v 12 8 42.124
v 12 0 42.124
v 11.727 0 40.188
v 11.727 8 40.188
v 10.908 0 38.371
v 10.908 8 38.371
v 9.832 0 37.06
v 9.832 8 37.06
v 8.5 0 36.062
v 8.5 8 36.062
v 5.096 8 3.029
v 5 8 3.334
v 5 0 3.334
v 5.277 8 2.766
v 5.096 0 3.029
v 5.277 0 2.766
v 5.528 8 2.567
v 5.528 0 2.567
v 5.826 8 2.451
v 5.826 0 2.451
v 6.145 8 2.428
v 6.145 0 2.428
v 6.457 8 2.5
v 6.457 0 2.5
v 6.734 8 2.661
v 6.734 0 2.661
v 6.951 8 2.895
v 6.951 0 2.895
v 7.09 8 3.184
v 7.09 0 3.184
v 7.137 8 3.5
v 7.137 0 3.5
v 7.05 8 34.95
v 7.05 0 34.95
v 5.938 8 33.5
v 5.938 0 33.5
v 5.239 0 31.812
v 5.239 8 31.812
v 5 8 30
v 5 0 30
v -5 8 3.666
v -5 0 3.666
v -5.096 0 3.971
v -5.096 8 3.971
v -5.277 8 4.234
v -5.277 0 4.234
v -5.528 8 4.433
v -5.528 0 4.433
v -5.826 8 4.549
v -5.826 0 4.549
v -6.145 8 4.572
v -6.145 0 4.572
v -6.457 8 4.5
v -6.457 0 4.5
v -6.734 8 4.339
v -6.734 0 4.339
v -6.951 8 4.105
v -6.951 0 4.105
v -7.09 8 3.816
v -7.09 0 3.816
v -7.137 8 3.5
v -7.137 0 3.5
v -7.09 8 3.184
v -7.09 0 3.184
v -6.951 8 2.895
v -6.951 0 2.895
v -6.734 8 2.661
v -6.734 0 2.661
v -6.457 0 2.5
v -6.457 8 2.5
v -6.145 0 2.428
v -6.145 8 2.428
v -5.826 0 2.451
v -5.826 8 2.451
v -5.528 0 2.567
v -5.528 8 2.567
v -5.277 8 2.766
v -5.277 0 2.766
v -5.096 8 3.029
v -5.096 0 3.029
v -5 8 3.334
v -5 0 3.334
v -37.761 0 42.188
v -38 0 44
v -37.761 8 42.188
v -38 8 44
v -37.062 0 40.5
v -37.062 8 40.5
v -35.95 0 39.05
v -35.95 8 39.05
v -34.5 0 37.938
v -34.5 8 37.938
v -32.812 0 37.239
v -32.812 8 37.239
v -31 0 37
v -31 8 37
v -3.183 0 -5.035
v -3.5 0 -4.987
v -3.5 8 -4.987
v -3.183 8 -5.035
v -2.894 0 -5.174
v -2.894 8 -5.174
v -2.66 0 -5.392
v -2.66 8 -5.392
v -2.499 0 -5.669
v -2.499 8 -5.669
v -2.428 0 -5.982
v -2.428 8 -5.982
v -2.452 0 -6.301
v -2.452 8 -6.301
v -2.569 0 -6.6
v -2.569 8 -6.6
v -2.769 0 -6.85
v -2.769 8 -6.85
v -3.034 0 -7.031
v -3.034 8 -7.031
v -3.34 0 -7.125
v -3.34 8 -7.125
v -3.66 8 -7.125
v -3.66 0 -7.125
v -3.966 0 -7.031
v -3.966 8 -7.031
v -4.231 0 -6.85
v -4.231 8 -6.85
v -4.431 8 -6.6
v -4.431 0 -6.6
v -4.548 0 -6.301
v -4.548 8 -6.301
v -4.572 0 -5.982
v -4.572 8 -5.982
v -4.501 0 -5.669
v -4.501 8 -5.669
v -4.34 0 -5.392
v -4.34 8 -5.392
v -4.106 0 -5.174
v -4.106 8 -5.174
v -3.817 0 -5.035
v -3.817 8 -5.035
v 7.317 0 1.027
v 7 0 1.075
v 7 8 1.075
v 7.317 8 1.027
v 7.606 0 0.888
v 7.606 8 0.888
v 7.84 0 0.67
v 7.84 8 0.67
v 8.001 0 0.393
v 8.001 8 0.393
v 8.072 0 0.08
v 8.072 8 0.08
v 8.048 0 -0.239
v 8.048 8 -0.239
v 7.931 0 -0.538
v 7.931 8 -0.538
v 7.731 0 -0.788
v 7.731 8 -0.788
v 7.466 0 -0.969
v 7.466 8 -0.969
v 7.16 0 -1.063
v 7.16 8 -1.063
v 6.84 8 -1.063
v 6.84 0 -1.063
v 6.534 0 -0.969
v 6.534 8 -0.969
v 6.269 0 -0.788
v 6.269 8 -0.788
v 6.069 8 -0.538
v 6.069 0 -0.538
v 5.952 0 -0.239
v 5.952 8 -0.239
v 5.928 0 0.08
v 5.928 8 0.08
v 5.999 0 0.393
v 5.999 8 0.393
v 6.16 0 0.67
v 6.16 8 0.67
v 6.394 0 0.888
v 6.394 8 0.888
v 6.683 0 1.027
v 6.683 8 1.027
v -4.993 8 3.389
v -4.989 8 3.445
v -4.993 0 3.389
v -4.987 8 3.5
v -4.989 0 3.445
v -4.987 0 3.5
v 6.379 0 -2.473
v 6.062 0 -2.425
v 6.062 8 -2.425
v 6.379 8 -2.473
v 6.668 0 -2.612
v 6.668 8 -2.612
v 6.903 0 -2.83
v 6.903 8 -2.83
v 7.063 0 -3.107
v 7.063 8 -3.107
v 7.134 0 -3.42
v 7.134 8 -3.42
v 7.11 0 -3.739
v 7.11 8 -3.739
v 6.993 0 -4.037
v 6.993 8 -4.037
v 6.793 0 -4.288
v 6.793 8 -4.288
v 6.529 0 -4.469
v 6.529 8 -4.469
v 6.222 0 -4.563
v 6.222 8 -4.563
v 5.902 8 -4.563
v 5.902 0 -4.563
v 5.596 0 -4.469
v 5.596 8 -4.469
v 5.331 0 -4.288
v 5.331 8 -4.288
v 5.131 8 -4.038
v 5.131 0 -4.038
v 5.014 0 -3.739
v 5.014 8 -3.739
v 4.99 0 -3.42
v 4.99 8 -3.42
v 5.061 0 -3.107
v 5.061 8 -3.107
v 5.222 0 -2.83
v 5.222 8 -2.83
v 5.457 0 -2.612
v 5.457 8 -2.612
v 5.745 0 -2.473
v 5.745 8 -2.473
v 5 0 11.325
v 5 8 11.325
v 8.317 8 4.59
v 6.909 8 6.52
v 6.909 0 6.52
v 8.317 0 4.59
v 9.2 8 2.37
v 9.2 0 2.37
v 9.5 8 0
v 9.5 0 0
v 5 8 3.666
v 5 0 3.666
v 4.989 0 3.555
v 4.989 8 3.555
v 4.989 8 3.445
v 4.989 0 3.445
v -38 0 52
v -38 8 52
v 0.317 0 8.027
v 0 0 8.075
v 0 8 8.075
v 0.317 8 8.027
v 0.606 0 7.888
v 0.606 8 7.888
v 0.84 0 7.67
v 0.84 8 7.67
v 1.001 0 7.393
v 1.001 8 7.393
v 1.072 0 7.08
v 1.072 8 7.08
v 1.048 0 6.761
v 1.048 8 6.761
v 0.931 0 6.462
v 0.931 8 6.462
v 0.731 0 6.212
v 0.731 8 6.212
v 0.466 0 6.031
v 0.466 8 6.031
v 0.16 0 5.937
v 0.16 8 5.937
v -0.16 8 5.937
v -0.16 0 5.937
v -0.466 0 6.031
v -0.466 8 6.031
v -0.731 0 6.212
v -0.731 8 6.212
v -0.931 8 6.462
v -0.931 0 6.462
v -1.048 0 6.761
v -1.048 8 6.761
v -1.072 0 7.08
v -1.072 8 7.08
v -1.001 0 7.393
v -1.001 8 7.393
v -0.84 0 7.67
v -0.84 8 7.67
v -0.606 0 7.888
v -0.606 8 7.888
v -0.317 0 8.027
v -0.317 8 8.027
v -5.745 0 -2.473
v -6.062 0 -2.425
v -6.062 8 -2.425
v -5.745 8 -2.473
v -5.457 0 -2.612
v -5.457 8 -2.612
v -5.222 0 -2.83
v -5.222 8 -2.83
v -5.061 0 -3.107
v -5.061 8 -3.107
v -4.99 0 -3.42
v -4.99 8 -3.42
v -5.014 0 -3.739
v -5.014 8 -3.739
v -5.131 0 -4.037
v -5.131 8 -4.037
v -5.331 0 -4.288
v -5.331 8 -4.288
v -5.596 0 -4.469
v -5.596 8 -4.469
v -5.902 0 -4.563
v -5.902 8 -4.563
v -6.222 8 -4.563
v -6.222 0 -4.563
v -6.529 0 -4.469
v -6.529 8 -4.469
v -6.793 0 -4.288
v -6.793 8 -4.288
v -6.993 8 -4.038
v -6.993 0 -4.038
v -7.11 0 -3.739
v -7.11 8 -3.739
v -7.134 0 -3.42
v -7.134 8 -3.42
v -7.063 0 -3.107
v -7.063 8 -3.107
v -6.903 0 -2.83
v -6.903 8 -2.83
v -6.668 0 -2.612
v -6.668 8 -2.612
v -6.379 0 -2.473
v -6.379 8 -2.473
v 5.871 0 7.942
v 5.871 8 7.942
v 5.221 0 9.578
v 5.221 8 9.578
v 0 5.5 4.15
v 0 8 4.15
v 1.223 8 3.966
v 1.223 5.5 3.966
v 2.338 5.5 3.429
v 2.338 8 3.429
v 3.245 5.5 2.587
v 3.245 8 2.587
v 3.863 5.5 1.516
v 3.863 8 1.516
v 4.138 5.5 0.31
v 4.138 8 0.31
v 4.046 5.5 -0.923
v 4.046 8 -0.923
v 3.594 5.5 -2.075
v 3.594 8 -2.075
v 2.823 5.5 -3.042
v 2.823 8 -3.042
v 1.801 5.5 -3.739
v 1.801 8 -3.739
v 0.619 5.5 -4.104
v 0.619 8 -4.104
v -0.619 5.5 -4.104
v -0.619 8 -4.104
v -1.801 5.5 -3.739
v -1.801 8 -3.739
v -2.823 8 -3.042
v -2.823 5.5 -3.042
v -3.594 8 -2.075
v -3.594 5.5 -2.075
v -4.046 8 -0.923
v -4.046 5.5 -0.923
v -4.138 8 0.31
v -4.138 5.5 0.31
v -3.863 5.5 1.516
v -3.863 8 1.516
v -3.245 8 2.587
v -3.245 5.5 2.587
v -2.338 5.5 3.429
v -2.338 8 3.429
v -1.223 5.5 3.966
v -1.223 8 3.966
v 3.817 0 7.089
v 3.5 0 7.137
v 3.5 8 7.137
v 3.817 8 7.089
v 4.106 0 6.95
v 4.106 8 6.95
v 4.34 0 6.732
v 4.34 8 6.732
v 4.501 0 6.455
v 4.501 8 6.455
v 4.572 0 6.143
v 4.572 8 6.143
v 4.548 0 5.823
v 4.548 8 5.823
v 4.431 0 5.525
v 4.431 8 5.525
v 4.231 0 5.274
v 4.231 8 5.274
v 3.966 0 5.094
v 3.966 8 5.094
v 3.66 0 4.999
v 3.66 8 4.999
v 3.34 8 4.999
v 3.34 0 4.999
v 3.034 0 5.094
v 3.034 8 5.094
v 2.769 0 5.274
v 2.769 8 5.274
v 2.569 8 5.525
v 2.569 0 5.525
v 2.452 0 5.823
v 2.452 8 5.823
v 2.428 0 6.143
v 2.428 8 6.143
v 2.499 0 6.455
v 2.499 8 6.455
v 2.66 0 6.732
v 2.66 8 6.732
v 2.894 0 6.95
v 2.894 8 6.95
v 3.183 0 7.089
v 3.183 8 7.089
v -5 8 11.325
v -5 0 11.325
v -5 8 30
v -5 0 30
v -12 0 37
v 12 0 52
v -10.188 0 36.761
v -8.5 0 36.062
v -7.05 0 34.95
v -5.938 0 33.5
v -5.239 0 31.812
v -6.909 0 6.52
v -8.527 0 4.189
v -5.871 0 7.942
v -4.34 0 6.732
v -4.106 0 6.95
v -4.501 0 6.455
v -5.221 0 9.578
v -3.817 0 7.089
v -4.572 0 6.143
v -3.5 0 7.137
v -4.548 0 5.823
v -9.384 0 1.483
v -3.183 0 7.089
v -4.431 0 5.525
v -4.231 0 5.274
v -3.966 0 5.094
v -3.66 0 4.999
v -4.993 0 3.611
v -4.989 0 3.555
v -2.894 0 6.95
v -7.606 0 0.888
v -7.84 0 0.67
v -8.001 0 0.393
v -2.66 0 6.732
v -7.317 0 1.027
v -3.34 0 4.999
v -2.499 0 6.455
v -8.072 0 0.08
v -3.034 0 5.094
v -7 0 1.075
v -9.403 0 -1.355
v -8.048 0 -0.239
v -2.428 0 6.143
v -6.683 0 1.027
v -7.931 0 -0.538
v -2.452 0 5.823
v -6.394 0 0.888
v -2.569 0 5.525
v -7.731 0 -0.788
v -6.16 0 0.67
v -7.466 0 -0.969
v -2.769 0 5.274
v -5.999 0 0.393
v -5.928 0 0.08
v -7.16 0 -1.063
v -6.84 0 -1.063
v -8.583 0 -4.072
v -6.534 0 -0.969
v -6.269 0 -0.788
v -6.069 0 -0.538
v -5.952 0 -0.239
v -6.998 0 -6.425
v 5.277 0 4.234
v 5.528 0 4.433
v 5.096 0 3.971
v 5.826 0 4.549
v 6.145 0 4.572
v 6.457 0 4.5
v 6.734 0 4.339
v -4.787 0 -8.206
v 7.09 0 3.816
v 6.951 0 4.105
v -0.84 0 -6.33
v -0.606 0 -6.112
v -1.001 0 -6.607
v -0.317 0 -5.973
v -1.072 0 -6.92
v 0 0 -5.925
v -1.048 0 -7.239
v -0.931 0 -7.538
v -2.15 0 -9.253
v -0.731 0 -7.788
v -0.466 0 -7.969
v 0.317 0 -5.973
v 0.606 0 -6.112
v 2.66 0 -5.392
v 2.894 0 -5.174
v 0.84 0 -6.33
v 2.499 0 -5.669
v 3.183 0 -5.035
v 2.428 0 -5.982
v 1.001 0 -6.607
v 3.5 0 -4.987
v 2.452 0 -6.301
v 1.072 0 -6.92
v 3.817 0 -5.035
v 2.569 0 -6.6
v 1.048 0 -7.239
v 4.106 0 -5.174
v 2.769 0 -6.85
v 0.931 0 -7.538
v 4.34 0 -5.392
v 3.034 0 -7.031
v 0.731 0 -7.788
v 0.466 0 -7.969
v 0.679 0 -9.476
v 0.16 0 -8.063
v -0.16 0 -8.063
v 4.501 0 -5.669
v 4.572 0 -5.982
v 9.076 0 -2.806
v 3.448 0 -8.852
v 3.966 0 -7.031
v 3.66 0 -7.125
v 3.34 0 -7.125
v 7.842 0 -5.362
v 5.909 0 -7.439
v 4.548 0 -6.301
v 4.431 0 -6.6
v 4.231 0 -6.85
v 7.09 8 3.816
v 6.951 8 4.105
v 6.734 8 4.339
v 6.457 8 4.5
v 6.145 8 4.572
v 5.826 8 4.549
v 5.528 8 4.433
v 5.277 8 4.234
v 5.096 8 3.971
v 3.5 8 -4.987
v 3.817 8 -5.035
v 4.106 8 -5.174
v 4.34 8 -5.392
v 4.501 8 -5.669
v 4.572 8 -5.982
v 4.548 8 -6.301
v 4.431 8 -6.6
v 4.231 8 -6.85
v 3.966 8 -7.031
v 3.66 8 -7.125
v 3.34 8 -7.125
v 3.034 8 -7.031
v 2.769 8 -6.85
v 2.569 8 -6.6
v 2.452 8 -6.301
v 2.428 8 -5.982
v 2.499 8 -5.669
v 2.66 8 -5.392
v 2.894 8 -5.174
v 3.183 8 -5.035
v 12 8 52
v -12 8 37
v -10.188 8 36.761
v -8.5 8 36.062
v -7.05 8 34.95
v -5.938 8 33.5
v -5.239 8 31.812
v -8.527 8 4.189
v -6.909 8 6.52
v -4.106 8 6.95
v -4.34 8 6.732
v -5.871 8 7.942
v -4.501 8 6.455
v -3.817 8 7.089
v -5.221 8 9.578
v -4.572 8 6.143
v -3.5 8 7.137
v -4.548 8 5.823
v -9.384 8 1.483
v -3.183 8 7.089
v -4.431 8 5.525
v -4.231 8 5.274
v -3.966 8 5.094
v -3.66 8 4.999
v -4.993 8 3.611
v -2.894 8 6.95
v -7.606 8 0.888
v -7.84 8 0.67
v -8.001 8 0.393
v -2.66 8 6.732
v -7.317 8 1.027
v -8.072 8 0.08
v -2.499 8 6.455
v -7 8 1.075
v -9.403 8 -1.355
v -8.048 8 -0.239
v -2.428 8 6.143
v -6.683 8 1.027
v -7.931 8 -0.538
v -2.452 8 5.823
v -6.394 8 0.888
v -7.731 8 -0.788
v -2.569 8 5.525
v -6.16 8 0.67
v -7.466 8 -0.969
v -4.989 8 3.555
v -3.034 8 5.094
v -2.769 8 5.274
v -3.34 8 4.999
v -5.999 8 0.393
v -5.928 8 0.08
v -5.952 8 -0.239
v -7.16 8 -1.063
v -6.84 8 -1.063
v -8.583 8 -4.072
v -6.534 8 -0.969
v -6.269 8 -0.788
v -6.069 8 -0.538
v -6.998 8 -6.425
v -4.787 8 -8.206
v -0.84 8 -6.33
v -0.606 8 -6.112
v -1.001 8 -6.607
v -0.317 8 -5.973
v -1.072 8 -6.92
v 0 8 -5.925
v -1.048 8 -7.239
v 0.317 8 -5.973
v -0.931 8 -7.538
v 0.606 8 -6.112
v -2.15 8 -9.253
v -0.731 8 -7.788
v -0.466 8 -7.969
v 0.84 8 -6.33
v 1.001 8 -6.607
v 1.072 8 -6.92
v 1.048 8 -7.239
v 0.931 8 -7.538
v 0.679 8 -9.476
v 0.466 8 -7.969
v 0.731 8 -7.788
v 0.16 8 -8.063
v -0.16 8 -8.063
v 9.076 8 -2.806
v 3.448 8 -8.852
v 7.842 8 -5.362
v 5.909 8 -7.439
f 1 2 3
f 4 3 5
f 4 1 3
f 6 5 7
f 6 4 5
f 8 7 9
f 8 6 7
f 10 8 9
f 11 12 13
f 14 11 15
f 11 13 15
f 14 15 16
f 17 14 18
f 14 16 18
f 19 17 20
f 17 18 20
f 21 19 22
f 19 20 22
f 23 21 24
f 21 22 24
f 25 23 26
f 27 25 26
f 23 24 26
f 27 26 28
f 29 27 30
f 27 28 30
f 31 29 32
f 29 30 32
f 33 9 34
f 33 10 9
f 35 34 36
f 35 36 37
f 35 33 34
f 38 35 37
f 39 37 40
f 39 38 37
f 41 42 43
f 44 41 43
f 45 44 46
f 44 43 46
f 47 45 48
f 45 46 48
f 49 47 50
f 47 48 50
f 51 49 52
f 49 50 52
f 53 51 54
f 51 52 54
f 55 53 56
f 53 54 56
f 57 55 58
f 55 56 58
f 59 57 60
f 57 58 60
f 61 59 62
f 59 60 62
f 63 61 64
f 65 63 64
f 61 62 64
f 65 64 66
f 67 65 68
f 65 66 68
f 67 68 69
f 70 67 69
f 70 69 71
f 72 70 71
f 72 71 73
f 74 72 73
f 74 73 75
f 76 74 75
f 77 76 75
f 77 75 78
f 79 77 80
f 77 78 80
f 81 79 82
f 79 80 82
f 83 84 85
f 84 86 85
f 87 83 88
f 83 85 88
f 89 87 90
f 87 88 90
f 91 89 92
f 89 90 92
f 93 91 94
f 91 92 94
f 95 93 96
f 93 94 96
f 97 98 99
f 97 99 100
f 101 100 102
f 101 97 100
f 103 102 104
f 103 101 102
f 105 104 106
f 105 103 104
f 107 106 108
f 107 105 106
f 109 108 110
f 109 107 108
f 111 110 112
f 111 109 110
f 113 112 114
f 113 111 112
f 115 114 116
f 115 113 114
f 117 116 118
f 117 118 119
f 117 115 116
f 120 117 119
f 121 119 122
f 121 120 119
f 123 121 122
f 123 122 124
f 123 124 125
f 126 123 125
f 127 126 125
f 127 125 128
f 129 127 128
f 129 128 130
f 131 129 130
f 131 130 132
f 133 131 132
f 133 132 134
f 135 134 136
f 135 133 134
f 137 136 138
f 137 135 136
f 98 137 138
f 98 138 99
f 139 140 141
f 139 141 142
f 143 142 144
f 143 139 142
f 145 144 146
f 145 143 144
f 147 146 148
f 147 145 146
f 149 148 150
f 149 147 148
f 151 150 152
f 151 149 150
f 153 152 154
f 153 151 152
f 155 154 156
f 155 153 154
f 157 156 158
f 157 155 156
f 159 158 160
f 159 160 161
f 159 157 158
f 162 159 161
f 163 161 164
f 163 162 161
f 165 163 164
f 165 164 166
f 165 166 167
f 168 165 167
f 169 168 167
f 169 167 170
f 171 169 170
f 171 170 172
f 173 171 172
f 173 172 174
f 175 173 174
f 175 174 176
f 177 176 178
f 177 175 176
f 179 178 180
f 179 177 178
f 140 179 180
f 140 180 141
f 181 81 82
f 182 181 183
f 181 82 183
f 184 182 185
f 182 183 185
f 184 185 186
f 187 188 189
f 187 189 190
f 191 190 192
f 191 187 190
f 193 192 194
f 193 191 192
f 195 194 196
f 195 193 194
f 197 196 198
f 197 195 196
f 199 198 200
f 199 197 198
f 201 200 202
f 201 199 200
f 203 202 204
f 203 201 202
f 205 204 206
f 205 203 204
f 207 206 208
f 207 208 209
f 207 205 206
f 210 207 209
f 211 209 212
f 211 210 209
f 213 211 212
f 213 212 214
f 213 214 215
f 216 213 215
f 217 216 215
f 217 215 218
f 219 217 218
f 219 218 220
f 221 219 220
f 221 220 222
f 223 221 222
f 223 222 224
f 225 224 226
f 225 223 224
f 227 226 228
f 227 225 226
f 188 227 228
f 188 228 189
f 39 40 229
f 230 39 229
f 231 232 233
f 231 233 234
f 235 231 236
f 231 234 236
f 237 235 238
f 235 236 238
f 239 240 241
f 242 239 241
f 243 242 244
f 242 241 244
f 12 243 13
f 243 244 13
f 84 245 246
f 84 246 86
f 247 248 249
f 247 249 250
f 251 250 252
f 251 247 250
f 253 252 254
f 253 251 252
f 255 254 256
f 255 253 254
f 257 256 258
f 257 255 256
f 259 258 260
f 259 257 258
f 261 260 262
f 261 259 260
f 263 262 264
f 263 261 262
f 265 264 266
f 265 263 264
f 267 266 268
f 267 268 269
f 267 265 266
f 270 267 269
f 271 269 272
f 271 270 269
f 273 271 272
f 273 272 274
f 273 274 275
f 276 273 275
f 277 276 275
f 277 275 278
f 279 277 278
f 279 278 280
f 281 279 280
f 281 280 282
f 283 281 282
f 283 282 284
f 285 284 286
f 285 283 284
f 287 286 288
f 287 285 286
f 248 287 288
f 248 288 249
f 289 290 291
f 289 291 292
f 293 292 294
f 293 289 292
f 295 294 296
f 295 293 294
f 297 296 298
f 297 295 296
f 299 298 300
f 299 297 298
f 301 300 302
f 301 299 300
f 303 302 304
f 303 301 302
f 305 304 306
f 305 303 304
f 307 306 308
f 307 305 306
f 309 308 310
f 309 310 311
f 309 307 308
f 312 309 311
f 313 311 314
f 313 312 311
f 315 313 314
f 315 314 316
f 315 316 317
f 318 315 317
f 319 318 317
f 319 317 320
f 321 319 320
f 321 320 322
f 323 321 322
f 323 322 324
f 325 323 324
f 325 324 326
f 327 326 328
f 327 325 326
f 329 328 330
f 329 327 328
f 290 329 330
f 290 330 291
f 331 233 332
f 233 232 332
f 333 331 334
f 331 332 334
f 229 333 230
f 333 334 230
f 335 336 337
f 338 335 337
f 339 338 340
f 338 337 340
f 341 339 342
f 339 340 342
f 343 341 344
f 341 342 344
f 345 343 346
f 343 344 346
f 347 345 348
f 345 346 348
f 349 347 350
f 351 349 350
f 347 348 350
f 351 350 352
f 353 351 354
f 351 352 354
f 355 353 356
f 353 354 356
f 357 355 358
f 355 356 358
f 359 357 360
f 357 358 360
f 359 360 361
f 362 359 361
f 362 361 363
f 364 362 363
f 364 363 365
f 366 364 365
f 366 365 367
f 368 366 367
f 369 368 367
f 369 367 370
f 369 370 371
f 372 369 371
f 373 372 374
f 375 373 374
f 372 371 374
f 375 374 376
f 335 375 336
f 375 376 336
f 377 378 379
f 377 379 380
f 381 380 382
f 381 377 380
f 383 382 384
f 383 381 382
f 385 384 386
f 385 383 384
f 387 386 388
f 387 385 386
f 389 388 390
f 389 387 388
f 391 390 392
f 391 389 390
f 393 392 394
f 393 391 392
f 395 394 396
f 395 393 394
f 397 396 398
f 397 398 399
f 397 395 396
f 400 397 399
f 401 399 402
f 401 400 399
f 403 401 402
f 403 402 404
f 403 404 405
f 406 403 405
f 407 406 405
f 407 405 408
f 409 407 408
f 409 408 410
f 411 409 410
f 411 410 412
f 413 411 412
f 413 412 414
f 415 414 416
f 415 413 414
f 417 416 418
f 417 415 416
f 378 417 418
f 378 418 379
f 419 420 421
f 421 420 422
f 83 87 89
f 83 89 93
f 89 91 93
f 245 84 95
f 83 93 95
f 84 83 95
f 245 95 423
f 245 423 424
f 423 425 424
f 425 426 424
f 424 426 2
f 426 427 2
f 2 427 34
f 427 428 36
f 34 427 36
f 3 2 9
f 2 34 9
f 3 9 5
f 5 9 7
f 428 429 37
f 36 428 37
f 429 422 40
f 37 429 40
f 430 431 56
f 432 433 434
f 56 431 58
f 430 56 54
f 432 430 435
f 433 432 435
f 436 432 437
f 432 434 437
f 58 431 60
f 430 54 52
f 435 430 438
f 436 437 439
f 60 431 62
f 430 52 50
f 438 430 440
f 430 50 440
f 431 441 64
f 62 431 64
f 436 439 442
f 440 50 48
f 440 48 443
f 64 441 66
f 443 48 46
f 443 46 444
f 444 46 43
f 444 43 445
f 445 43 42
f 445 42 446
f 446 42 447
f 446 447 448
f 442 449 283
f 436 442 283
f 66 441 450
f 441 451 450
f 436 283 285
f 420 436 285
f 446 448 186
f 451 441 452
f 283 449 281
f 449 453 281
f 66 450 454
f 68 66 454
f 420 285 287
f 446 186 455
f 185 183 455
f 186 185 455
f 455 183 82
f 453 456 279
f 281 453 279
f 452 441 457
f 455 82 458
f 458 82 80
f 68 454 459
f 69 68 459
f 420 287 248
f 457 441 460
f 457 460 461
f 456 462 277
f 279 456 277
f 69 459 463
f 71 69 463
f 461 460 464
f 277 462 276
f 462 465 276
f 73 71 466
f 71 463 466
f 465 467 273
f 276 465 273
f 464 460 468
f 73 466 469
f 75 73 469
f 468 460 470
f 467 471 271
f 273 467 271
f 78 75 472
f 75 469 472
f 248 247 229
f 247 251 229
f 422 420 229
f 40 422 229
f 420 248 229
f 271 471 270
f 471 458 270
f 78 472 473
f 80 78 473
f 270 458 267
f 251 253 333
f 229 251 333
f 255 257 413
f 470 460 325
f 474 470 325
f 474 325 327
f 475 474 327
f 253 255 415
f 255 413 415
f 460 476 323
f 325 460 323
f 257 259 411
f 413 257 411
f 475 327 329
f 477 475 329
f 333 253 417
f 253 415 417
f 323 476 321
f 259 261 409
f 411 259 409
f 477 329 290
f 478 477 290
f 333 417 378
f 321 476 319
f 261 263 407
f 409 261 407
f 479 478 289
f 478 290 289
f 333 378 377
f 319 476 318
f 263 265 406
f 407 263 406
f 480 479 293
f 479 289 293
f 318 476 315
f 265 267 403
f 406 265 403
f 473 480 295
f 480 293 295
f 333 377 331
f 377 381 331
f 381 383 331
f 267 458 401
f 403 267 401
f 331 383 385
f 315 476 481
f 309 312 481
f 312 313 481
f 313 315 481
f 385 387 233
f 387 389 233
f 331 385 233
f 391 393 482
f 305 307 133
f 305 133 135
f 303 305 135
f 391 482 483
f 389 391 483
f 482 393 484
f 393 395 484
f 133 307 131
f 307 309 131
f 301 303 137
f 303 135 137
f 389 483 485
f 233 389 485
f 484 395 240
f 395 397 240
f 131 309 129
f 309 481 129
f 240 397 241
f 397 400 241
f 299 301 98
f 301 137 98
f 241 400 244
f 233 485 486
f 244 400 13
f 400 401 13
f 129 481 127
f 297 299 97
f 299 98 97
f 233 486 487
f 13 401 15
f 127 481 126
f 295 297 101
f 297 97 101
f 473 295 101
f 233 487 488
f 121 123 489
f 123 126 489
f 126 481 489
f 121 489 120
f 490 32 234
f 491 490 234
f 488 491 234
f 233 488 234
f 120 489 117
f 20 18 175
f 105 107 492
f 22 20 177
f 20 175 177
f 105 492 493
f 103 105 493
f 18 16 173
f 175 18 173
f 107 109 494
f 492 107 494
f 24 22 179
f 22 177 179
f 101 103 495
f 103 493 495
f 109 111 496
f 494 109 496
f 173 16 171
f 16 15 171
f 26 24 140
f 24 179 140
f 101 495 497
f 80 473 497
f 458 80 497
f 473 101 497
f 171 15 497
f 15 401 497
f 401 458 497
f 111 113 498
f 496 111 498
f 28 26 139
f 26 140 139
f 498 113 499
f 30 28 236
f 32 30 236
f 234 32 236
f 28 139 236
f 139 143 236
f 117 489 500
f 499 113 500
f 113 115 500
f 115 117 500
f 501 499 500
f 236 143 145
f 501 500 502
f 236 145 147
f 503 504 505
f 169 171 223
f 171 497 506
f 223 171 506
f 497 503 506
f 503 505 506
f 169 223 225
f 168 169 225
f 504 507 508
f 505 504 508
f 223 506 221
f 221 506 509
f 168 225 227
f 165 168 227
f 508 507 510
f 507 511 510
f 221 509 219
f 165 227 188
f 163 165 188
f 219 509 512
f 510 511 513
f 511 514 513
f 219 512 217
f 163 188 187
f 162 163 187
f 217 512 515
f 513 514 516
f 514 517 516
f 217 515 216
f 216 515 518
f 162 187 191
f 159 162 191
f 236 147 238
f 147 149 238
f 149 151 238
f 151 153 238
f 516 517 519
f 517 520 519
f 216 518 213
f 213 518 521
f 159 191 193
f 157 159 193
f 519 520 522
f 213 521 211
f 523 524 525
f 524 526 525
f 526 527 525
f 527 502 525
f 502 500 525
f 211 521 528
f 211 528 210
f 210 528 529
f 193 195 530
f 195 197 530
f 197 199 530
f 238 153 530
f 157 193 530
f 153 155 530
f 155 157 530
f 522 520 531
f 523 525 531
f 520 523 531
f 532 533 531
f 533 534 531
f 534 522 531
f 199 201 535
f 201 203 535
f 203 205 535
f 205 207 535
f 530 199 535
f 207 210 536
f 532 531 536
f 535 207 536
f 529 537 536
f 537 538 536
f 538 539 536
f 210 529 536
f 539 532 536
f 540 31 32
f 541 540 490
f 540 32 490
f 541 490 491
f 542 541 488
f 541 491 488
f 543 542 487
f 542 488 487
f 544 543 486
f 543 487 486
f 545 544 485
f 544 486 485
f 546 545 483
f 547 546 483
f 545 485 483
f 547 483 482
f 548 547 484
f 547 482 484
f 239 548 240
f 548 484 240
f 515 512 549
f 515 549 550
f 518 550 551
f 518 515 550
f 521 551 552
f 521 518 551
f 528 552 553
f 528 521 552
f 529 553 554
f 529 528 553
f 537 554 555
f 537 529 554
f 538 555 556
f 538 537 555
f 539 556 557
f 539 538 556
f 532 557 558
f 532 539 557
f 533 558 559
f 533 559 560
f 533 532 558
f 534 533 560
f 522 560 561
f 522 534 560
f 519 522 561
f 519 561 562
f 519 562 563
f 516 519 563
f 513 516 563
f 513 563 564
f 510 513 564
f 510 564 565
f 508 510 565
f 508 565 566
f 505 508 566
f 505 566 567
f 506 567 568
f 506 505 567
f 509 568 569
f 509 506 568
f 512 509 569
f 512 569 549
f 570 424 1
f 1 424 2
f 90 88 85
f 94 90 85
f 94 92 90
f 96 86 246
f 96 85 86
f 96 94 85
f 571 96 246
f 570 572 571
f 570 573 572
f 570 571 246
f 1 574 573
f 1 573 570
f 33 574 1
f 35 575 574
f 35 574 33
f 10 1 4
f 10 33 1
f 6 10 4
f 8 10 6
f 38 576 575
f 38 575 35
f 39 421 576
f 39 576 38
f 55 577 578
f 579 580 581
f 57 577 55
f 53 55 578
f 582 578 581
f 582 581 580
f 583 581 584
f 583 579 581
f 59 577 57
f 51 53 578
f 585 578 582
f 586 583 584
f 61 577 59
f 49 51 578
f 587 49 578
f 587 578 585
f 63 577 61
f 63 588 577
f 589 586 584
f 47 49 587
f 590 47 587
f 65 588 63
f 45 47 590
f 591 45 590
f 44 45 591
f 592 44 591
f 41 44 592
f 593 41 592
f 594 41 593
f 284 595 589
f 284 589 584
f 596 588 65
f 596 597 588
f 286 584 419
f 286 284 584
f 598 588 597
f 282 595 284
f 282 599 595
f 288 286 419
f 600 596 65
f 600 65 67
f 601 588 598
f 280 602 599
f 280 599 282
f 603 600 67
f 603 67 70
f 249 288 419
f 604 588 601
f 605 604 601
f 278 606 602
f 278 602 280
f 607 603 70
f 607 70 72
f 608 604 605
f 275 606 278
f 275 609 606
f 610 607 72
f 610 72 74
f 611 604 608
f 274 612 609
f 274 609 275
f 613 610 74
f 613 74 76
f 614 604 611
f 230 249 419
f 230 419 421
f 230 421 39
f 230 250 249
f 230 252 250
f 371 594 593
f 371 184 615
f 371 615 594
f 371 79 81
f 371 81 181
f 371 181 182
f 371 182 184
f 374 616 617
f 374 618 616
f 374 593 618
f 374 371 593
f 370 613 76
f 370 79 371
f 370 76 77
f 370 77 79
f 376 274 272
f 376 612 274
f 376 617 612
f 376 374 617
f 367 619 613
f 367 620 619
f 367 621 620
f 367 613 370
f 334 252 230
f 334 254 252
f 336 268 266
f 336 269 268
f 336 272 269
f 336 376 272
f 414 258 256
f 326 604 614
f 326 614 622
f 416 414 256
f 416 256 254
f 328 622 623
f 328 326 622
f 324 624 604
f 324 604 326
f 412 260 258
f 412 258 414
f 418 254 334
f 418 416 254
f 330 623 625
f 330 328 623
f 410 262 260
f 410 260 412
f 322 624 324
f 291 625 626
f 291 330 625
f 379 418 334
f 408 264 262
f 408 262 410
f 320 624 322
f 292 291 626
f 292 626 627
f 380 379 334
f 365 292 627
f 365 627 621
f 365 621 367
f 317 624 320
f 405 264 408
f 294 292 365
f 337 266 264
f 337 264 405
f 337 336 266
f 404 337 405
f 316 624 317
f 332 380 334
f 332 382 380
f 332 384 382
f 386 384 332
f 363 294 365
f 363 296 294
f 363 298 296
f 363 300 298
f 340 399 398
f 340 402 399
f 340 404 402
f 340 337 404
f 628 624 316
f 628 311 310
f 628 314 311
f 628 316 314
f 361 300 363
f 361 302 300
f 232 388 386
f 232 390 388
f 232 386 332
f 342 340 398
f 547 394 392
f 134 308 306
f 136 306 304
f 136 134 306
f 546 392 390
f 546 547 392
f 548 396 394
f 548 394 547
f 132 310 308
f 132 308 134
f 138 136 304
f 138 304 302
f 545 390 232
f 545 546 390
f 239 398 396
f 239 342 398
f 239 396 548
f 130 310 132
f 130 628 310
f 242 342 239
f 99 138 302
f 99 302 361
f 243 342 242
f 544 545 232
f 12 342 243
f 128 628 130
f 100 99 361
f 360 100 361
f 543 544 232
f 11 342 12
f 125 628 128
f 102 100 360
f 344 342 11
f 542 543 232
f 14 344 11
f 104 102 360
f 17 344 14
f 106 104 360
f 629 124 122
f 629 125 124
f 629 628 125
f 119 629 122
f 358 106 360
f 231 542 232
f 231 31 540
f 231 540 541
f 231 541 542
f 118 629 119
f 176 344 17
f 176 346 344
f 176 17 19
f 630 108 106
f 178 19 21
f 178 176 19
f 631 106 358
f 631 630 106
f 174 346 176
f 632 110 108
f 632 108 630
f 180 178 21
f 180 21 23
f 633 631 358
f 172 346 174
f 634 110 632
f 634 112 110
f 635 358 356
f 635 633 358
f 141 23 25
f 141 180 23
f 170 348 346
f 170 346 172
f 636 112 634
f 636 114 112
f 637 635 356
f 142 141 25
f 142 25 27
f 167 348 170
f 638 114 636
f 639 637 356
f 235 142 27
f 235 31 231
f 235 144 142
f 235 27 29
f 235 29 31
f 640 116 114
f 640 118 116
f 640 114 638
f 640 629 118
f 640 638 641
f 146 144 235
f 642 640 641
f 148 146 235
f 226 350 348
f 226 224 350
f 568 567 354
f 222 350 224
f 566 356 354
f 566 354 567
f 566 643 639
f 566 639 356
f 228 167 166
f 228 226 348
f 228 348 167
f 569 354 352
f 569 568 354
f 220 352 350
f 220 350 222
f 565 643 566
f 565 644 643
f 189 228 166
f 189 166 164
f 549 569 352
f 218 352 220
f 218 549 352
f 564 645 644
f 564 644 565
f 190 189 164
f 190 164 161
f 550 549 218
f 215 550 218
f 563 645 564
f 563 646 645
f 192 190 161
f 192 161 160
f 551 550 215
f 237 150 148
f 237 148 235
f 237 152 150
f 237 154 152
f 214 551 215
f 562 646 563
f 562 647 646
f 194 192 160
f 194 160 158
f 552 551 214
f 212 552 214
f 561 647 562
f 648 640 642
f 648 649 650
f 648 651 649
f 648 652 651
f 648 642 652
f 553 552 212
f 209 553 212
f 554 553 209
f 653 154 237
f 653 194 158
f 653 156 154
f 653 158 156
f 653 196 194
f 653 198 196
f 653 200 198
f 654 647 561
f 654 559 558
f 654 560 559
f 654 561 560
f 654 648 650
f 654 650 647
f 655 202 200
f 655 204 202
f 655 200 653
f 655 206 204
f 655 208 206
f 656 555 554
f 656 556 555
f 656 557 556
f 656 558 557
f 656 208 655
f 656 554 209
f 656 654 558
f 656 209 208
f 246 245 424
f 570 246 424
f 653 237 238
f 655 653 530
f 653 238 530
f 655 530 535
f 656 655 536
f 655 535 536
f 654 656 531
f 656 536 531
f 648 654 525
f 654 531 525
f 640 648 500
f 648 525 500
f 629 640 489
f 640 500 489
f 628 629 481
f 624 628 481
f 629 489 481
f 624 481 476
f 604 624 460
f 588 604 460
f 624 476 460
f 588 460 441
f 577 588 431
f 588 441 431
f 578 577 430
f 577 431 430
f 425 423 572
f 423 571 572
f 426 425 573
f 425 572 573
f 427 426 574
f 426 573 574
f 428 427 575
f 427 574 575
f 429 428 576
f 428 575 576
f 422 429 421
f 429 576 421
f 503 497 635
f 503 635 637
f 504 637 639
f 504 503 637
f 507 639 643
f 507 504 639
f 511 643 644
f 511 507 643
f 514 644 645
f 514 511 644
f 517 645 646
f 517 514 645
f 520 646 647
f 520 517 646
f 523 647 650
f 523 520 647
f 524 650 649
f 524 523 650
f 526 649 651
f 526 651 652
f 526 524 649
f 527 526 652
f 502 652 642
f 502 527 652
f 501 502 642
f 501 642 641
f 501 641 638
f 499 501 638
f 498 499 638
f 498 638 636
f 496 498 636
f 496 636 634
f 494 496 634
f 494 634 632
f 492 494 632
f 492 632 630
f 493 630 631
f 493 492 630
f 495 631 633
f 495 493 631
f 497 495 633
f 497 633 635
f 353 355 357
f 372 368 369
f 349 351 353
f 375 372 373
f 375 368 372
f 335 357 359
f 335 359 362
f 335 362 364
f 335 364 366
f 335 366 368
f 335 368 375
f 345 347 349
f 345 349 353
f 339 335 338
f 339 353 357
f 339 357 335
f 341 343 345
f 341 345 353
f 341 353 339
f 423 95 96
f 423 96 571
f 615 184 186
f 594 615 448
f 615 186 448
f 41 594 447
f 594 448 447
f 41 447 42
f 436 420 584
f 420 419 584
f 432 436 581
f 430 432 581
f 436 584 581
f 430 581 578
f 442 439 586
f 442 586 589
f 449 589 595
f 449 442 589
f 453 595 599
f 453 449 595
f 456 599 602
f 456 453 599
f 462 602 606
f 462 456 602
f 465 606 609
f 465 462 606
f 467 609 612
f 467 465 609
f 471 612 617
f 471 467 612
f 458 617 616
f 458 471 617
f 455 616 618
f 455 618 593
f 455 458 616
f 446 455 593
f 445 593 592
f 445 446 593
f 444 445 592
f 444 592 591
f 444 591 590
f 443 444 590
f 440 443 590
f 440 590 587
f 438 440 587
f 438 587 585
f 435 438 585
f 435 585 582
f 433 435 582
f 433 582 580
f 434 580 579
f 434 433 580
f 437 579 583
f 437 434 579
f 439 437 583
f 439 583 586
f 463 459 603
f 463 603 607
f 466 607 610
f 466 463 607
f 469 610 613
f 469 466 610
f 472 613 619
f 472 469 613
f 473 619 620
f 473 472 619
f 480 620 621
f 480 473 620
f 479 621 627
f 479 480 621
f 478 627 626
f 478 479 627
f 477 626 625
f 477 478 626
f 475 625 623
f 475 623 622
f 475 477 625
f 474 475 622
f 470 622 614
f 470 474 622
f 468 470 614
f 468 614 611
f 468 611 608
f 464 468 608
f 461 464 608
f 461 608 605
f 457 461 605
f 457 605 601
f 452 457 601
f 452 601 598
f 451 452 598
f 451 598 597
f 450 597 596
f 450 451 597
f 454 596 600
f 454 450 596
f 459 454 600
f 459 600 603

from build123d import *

# Parameters (mm, degrees)
SKETCH1_R           = 1.075
SKETCH1_W           = 50
SKETCH1_H           = 15
BOSS_EXTRUDE1_DEPTH = 8
SKETCH2_R           = 4.15
CUT_EXTRUDE1_DEPTH  = 2.5
FILLET1_R           = 7
FILLET2_R           = 7
FILLET3_R           = 7
FILLET4_R           = 7
FILLET5_R           = 7


with BuildPart() as part:
    # Sketch1 → Boss-Extrude1 (new body)
    # profile 1 of 4: a face of its own
    with BuildSketch(Plane(origin=(0, 0, 0), x_dir=(1, 0, 0), z_dir=(0, 1, 0))):
        with BuildLine():
            Line((-5, -8.077747211), (-5, -37))
            Line((-5, -37), (5, -37))
            Line((5, -37), (5, -8.077747211))
            ThreePointArc((5, -8.077747211), (0, -9.5), (-5, -8.077747211))
        make_face()
    # profile 2 of 4: a face of its own
    with BuildSketch(Plane(origin=(0, 0, 0), x_dir=(1, 0, 0), z_dir=(0, 1, 0))):
        with BuildLine():
            Line((-5, -3.665539315), (-5, -8.077747211))
            ThreePointArc((-5, -8.077747211), (0, -9.5), (5, -8.077747211))
            Line((5, -8.077747211), (5, -3.665539315))
            ThreePointArc((5, -3.665539315), (4.987177826, -3.5), (5, -3.334460685))
            Line((5, -3.334460685), (5, 0))
            Line((5, 0), (-5, 0))
            Line((-5, 0), (-5, -3.334460685))
            ThreePointArc((-5, -3.334460685), (-4.990388163, -3.416982422), (-4.987177826, -3.5))
            ThreePointArc((-4.987177826, -3.5), (-4.990388163, -3.583017578), (-5, -3.665539315))
        make_face()
        with Locations(Location((-3.5, -6.062177826, 0), (0, 0, 270))):
            Circle(SKETCH1_R, mode=Mode.SUBTRACT)
        with Locations(Location((0, -7, 0), (0, 0, 270))):
            Circle(SKETCH1_R, mode=Mode.SUBTRACT)
        with Locations(Location((3.5, -6.062177826, 0), (0, 0, 270))):
            Circle(SKETCH1_R, mode=Mode.SUBTRACT)
    # profile 3 of 4: a face of its own
    with BuildSketch(Plane(origin=(0, 0, 0), x_dir=(1, 0, 0), z_dir=(0, 1, 0))):
        with BuildLine():
            ThreePointArc((9.5, 0), (-4.623310502, 8.299096336), (-5, -8.077747211))
            Line((-5, -8.077747211), (-5, -3.665539315))
            ThreePointArc((-5, -3.665539315), (-7.137177826, -3.5), (-5, -3.334460685))
            Line((-5, -3.334460685), (-5, 0))
            Line((-5, 0), (5, 0))
            Line((5, 0), (5, -3.334460685))
            ThreePointArc((5, -3.334460685), (6.145195405, -2.428210337), (7.137177826, -3.5))
            ThreePointArc((7.137177826, -3.5), (6.145195405, -4.571789663), (5, -3.665539315))
            Line((5, -3.665539315), (5, -8.077747211))
            ThreePointArc((5, -8.077747211), (8.299096336, -4.623310502), (9.5, 0))
        make_face()
        with Locations(Location((-7, 0, 0), (0, 0, 270))):
            Circle(SKETCH1_R, mode=Mode.SUBTRACT)
        with Locations(Location((-6.062177826, 3.5, 0), (0, 0, 270))):
            Circle(SKETCH1_R, mode=Mode.SUBTRACT)
        with Locations(Location((-3.5, 6.062177826, 0), (0, 0, 270))):
            Circle(SKETCH1_R, mode=Mode.SUBTRACT)
        with Locations(Location((7, 0, 0), (0, 0, 270))):
            Circle(SKETCH1_R, mode=Mode.SUBTRACT)
        with Locations(Location((0, 7, 0), (0, 0, 270))):
            Circle(SKETCH1_R, mode=Mode.SUBTRACT)
        with Locations(Location((3.5, 6.062177826, 0), (0, 0, 270))):
            Circle(SKETCH1_R, mode=Mode.SUBTRACT)
        with Locations(Location((6.062177826, 3.5, 0), (0, 0, 270))):
            Circle(SKETCH1_R, mode=Mode.SUBTRACT)
    # profile 4 of 4: a face of its own
    with BuildSketch(Plane(origin=(0, 0, 0), x_dir=(1, 0, 0), z_dir=(0, 1, 0))):
        with Locations((-13, -44.5)):
            Rectangle(SKETCH1_W, SKETCH1_H)
    extrude(amount=BOSS_EXTRUDE1_DEPTH)

    # Sketch2 → Cut-Extrude1 (cut)
    with BuildSketch(Plane(origin=(0, 8, 0), x_dir=(1, 0, 0), z_dir=(0, 1, 0))):
        with Locations(Location((0, 0, 0), (0, 0, 270))):
            Circle(SKETCH2_R)
    extrude(amount=-CUT_EXTRUDE1_DEPTH, mode=Mode.SUBTRACT)

    # Fillet1
    fillet1_edges = [part.edges().sort_by_distance(p)[0] for p in [
        (5, 4, 37),
    ]]
    fillet(fillet1_edges, radius=FILLET1_R - 0.0001)  # a hair under: the kernel refuses the full size

    # Fillet2
    fillet2_edges = [part.edges().sort_by_distance(p)[0] for p in [
        (-5, 4, 37),
    ]]
    fillet(fillet2_edges, radius=FILLET2_R)

    # Fillet3
    fillet3_edges = [part.edges().sort_by_distance(p)[0] for p in [
        (-5, 4, 8.077747211),
        (5, 4, 8.077747211),
    ]]
    fillet(fillet3_edges, radius=FILLET3_R)

    # Fillet4
    fillet4_edges = [part.edges().sort_by_distance(p)[0] for p in [
        (12, 4, 37),
    ]]
    fillet(fillet4_edges, radius=FILLET4_R)

    # Fillet5
    fillet5_edges = [part.edges().sort_by_distance(p)[0] for p in [
        (-38, 4, 37),
    ]]
    fillet(fillet5_edges, radius=FILLET5_R)


solid = part.part
